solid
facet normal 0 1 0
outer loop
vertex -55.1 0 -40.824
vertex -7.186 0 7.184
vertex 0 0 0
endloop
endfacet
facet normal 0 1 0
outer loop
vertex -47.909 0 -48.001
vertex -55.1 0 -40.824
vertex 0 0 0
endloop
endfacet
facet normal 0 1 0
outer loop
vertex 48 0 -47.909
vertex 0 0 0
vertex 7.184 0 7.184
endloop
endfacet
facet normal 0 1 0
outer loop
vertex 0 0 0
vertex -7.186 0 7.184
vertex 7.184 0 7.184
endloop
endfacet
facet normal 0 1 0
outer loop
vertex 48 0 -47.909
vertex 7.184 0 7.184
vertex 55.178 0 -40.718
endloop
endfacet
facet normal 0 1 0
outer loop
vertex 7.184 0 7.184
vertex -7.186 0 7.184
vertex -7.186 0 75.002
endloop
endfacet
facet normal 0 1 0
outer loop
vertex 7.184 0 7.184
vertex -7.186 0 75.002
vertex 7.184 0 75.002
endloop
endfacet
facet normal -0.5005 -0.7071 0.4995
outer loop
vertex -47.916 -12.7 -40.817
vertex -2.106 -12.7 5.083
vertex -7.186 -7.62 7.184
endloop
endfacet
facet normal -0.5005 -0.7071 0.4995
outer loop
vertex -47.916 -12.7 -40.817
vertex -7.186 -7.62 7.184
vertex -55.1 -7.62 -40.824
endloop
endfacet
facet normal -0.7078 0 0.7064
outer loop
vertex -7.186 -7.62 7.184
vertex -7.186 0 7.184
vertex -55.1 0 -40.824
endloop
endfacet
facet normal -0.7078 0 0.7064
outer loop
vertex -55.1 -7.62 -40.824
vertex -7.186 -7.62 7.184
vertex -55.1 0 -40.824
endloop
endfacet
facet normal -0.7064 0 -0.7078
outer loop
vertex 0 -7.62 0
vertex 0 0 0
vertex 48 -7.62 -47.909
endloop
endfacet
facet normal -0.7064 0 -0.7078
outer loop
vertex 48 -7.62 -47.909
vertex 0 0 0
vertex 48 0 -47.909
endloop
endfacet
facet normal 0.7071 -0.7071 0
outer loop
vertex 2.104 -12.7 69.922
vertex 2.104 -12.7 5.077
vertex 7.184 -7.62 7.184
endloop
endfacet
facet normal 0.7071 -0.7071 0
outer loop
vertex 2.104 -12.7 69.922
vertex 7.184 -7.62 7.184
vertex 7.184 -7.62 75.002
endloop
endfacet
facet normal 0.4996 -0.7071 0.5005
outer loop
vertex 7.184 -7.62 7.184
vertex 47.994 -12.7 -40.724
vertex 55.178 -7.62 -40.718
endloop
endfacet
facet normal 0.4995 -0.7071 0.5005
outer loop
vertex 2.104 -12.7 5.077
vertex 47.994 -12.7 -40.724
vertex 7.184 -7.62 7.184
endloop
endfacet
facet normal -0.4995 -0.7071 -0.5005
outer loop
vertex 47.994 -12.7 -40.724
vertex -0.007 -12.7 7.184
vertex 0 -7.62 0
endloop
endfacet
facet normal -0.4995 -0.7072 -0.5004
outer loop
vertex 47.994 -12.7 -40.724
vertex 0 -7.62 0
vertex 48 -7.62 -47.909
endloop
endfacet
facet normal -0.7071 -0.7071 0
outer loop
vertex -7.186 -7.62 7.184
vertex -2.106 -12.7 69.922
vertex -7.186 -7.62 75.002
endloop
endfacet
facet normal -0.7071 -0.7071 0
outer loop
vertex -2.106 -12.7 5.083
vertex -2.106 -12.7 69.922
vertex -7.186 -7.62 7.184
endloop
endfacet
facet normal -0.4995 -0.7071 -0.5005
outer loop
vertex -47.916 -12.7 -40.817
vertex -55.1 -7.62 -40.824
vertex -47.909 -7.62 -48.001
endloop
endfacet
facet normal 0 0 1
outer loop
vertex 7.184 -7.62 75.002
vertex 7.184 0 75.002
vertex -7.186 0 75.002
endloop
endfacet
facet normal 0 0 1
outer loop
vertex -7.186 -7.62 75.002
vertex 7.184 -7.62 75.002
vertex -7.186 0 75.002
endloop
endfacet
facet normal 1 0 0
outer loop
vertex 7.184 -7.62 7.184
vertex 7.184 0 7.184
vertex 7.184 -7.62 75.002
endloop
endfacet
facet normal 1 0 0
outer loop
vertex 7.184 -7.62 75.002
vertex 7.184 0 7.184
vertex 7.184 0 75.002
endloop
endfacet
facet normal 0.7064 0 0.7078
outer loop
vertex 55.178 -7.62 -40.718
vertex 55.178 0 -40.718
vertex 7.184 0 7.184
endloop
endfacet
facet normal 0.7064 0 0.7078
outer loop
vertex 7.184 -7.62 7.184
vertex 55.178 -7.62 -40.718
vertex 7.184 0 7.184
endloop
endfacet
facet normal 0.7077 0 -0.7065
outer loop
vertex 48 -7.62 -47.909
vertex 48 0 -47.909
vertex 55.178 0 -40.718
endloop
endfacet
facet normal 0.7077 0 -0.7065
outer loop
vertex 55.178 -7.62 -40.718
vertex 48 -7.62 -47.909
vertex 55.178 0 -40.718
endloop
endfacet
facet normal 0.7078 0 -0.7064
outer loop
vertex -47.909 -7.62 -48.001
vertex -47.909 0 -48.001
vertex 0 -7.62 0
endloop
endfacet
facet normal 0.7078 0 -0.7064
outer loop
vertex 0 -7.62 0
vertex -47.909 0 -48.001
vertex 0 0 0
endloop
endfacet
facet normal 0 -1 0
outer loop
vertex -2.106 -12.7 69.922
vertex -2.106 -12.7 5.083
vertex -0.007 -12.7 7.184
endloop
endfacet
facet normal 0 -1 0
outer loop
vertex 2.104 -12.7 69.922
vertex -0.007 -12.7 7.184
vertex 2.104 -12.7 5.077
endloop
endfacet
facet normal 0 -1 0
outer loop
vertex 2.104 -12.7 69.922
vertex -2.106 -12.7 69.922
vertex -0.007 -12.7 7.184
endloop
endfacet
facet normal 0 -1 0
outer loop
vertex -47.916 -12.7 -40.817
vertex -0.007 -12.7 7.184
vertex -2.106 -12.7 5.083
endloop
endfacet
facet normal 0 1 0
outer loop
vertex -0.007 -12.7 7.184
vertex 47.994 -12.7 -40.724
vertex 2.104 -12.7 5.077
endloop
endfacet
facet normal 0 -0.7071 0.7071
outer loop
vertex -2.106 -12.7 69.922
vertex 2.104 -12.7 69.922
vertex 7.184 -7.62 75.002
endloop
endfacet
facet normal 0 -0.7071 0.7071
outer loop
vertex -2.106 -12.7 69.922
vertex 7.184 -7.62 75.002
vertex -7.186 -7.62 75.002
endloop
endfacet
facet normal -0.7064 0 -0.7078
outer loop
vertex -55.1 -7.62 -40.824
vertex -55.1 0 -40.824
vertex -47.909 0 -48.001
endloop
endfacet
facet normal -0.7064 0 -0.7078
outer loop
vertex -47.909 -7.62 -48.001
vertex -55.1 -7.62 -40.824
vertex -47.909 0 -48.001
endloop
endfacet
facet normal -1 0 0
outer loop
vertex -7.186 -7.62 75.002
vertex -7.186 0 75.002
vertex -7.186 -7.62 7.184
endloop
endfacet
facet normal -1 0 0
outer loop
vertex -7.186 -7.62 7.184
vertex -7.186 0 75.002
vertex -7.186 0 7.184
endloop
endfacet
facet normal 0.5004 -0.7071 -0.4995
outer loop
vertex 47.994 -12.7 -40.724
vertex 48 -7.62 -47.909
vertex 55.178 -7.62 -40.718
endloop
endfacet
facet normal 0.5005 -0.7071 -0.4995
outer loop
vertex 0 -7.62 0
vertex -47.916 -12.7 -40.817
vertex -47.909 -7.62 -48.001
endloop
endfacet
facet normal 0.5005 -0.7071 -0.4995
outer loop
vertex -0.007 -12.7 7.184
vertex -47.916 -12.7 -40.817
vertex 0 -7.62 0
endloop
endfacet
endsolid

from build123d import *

# Parameters (mm, degrees)
F1_DEPTH = 12.7
F2_SIZE  = 5.07999


# Not quite as in the source:
# - a fillet or chamfer is up to 0.001 mm smaller than in the source, because OpenCascade refuses the exact size


with BuildPart() as f1:
    # F0 (on Front) → F1 (new body)
    with BuildSketch(Plane.XZ):
        Polygon((-7.1858047352, 75.0022197947), (-7.1858047352, 7.1842197947), (-55.1002257696, -40.8236010231), (-47.909149441, -48.0009279096), (0, 0), (48.0004344931, -47.9086569679), (55.1777613797, -40.7175806394), (7.1841965553, 7.1842197947), (7.1841965553, 75.0022197947), align=None)
    extrude(amount=F1_DEPTH)

    # F2 (size 5.08 in the source; OpenCascade refuses exactly that, so slightly less here)
    f2_edges = [f1.edges().sort_by_distance(p)[0] for p in [
        (7.184197, -12.7, 41.09322),
        (-0.000804, -12.7, 75.00222),
        (-7.185805, -12.7, 41.09322),
        (-31.143015, -12.7, -16.819691),
        (-51.504688, -12.7, -44.412264),
        (-23.954575, -12.7, -24.000464),
        (24.000217, -12.7, -23.954328),
        (51.589098, -12.7, -44.313119),
        (31.180979, -12.7, -16.76668),
    ]]
    chamfer(f2_edges, length=F2_SIZE)


solid = f1.part
